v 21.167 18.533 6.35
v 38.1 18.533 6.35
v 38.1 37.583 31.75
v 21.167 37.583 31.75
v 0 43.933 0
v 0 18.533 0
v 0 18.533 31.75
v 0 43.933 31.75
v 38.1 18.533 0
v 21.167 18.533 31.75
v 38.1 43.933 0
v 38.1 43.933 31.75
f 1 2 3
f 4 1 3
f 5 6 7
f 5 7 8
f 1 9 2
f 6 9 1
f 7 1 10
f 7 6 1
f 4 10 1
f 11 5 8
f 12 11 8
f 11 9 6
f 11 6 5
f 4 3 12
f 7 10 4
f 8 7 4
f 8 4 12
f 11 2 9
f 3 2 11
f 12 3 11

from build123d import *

# Parameters (mm, degrees)
F0_W     = 25.4
F0_H     = 31.75
F1_DEPTH = 38.1
F3_DEPTH = 25.4
F4_DEPTH = 25.4
F6_DEPTH = 16.9333333333


# Not quite as in the source:
# - a length typed as a fraction of an inch, garbled in the dataset ("3 / 203.2 mm" for 3/8 in), is restored


with BuildPart() as f1:
    # F0 (on Right) → F1 (new body)
    with BuildSketch(Plane.YZ):
        with Locations((31.233229906, 15.875)):
            Rectangle(F0_W, F0_H)
    extrude(amount=F1_DEPTH)

    # F2 (on Right) → F3 (cut)
    with BuildSketch(Plane.YZ):
        Polygon((43.7832586467, 31.5612442791), (24.7332586467, 31.5612442791), (44.0856164074, 6.1630439534), align=None)
    extrude(amount=-F3_DEPTH, mode=Mode.SUBTRACT)

    # F2 (on Right) → F4 (cut)
    with BuildSketch(Plane.YZ):
        Polygon((43.7832586467, 31.5612442791), (24.7332586467, 31.5612442791), (44.0856164074, 6.1630439534), align=None)
    extrude(amount=-F4_DEPTH, mode=Mode.SUBTRACT)

    # F5 (on face) → F6 (cut)
    with BuildSketch(Plane.YZ.offset(38.1)):
        Polygon((18.533229906, 6.35), (37.583229906, 31.75), (18.533229906, 31.75), align=None)
    extrude(amount=-F6_DEPTH, mode=Mode.SUBTRACT)


solid = f1.part
